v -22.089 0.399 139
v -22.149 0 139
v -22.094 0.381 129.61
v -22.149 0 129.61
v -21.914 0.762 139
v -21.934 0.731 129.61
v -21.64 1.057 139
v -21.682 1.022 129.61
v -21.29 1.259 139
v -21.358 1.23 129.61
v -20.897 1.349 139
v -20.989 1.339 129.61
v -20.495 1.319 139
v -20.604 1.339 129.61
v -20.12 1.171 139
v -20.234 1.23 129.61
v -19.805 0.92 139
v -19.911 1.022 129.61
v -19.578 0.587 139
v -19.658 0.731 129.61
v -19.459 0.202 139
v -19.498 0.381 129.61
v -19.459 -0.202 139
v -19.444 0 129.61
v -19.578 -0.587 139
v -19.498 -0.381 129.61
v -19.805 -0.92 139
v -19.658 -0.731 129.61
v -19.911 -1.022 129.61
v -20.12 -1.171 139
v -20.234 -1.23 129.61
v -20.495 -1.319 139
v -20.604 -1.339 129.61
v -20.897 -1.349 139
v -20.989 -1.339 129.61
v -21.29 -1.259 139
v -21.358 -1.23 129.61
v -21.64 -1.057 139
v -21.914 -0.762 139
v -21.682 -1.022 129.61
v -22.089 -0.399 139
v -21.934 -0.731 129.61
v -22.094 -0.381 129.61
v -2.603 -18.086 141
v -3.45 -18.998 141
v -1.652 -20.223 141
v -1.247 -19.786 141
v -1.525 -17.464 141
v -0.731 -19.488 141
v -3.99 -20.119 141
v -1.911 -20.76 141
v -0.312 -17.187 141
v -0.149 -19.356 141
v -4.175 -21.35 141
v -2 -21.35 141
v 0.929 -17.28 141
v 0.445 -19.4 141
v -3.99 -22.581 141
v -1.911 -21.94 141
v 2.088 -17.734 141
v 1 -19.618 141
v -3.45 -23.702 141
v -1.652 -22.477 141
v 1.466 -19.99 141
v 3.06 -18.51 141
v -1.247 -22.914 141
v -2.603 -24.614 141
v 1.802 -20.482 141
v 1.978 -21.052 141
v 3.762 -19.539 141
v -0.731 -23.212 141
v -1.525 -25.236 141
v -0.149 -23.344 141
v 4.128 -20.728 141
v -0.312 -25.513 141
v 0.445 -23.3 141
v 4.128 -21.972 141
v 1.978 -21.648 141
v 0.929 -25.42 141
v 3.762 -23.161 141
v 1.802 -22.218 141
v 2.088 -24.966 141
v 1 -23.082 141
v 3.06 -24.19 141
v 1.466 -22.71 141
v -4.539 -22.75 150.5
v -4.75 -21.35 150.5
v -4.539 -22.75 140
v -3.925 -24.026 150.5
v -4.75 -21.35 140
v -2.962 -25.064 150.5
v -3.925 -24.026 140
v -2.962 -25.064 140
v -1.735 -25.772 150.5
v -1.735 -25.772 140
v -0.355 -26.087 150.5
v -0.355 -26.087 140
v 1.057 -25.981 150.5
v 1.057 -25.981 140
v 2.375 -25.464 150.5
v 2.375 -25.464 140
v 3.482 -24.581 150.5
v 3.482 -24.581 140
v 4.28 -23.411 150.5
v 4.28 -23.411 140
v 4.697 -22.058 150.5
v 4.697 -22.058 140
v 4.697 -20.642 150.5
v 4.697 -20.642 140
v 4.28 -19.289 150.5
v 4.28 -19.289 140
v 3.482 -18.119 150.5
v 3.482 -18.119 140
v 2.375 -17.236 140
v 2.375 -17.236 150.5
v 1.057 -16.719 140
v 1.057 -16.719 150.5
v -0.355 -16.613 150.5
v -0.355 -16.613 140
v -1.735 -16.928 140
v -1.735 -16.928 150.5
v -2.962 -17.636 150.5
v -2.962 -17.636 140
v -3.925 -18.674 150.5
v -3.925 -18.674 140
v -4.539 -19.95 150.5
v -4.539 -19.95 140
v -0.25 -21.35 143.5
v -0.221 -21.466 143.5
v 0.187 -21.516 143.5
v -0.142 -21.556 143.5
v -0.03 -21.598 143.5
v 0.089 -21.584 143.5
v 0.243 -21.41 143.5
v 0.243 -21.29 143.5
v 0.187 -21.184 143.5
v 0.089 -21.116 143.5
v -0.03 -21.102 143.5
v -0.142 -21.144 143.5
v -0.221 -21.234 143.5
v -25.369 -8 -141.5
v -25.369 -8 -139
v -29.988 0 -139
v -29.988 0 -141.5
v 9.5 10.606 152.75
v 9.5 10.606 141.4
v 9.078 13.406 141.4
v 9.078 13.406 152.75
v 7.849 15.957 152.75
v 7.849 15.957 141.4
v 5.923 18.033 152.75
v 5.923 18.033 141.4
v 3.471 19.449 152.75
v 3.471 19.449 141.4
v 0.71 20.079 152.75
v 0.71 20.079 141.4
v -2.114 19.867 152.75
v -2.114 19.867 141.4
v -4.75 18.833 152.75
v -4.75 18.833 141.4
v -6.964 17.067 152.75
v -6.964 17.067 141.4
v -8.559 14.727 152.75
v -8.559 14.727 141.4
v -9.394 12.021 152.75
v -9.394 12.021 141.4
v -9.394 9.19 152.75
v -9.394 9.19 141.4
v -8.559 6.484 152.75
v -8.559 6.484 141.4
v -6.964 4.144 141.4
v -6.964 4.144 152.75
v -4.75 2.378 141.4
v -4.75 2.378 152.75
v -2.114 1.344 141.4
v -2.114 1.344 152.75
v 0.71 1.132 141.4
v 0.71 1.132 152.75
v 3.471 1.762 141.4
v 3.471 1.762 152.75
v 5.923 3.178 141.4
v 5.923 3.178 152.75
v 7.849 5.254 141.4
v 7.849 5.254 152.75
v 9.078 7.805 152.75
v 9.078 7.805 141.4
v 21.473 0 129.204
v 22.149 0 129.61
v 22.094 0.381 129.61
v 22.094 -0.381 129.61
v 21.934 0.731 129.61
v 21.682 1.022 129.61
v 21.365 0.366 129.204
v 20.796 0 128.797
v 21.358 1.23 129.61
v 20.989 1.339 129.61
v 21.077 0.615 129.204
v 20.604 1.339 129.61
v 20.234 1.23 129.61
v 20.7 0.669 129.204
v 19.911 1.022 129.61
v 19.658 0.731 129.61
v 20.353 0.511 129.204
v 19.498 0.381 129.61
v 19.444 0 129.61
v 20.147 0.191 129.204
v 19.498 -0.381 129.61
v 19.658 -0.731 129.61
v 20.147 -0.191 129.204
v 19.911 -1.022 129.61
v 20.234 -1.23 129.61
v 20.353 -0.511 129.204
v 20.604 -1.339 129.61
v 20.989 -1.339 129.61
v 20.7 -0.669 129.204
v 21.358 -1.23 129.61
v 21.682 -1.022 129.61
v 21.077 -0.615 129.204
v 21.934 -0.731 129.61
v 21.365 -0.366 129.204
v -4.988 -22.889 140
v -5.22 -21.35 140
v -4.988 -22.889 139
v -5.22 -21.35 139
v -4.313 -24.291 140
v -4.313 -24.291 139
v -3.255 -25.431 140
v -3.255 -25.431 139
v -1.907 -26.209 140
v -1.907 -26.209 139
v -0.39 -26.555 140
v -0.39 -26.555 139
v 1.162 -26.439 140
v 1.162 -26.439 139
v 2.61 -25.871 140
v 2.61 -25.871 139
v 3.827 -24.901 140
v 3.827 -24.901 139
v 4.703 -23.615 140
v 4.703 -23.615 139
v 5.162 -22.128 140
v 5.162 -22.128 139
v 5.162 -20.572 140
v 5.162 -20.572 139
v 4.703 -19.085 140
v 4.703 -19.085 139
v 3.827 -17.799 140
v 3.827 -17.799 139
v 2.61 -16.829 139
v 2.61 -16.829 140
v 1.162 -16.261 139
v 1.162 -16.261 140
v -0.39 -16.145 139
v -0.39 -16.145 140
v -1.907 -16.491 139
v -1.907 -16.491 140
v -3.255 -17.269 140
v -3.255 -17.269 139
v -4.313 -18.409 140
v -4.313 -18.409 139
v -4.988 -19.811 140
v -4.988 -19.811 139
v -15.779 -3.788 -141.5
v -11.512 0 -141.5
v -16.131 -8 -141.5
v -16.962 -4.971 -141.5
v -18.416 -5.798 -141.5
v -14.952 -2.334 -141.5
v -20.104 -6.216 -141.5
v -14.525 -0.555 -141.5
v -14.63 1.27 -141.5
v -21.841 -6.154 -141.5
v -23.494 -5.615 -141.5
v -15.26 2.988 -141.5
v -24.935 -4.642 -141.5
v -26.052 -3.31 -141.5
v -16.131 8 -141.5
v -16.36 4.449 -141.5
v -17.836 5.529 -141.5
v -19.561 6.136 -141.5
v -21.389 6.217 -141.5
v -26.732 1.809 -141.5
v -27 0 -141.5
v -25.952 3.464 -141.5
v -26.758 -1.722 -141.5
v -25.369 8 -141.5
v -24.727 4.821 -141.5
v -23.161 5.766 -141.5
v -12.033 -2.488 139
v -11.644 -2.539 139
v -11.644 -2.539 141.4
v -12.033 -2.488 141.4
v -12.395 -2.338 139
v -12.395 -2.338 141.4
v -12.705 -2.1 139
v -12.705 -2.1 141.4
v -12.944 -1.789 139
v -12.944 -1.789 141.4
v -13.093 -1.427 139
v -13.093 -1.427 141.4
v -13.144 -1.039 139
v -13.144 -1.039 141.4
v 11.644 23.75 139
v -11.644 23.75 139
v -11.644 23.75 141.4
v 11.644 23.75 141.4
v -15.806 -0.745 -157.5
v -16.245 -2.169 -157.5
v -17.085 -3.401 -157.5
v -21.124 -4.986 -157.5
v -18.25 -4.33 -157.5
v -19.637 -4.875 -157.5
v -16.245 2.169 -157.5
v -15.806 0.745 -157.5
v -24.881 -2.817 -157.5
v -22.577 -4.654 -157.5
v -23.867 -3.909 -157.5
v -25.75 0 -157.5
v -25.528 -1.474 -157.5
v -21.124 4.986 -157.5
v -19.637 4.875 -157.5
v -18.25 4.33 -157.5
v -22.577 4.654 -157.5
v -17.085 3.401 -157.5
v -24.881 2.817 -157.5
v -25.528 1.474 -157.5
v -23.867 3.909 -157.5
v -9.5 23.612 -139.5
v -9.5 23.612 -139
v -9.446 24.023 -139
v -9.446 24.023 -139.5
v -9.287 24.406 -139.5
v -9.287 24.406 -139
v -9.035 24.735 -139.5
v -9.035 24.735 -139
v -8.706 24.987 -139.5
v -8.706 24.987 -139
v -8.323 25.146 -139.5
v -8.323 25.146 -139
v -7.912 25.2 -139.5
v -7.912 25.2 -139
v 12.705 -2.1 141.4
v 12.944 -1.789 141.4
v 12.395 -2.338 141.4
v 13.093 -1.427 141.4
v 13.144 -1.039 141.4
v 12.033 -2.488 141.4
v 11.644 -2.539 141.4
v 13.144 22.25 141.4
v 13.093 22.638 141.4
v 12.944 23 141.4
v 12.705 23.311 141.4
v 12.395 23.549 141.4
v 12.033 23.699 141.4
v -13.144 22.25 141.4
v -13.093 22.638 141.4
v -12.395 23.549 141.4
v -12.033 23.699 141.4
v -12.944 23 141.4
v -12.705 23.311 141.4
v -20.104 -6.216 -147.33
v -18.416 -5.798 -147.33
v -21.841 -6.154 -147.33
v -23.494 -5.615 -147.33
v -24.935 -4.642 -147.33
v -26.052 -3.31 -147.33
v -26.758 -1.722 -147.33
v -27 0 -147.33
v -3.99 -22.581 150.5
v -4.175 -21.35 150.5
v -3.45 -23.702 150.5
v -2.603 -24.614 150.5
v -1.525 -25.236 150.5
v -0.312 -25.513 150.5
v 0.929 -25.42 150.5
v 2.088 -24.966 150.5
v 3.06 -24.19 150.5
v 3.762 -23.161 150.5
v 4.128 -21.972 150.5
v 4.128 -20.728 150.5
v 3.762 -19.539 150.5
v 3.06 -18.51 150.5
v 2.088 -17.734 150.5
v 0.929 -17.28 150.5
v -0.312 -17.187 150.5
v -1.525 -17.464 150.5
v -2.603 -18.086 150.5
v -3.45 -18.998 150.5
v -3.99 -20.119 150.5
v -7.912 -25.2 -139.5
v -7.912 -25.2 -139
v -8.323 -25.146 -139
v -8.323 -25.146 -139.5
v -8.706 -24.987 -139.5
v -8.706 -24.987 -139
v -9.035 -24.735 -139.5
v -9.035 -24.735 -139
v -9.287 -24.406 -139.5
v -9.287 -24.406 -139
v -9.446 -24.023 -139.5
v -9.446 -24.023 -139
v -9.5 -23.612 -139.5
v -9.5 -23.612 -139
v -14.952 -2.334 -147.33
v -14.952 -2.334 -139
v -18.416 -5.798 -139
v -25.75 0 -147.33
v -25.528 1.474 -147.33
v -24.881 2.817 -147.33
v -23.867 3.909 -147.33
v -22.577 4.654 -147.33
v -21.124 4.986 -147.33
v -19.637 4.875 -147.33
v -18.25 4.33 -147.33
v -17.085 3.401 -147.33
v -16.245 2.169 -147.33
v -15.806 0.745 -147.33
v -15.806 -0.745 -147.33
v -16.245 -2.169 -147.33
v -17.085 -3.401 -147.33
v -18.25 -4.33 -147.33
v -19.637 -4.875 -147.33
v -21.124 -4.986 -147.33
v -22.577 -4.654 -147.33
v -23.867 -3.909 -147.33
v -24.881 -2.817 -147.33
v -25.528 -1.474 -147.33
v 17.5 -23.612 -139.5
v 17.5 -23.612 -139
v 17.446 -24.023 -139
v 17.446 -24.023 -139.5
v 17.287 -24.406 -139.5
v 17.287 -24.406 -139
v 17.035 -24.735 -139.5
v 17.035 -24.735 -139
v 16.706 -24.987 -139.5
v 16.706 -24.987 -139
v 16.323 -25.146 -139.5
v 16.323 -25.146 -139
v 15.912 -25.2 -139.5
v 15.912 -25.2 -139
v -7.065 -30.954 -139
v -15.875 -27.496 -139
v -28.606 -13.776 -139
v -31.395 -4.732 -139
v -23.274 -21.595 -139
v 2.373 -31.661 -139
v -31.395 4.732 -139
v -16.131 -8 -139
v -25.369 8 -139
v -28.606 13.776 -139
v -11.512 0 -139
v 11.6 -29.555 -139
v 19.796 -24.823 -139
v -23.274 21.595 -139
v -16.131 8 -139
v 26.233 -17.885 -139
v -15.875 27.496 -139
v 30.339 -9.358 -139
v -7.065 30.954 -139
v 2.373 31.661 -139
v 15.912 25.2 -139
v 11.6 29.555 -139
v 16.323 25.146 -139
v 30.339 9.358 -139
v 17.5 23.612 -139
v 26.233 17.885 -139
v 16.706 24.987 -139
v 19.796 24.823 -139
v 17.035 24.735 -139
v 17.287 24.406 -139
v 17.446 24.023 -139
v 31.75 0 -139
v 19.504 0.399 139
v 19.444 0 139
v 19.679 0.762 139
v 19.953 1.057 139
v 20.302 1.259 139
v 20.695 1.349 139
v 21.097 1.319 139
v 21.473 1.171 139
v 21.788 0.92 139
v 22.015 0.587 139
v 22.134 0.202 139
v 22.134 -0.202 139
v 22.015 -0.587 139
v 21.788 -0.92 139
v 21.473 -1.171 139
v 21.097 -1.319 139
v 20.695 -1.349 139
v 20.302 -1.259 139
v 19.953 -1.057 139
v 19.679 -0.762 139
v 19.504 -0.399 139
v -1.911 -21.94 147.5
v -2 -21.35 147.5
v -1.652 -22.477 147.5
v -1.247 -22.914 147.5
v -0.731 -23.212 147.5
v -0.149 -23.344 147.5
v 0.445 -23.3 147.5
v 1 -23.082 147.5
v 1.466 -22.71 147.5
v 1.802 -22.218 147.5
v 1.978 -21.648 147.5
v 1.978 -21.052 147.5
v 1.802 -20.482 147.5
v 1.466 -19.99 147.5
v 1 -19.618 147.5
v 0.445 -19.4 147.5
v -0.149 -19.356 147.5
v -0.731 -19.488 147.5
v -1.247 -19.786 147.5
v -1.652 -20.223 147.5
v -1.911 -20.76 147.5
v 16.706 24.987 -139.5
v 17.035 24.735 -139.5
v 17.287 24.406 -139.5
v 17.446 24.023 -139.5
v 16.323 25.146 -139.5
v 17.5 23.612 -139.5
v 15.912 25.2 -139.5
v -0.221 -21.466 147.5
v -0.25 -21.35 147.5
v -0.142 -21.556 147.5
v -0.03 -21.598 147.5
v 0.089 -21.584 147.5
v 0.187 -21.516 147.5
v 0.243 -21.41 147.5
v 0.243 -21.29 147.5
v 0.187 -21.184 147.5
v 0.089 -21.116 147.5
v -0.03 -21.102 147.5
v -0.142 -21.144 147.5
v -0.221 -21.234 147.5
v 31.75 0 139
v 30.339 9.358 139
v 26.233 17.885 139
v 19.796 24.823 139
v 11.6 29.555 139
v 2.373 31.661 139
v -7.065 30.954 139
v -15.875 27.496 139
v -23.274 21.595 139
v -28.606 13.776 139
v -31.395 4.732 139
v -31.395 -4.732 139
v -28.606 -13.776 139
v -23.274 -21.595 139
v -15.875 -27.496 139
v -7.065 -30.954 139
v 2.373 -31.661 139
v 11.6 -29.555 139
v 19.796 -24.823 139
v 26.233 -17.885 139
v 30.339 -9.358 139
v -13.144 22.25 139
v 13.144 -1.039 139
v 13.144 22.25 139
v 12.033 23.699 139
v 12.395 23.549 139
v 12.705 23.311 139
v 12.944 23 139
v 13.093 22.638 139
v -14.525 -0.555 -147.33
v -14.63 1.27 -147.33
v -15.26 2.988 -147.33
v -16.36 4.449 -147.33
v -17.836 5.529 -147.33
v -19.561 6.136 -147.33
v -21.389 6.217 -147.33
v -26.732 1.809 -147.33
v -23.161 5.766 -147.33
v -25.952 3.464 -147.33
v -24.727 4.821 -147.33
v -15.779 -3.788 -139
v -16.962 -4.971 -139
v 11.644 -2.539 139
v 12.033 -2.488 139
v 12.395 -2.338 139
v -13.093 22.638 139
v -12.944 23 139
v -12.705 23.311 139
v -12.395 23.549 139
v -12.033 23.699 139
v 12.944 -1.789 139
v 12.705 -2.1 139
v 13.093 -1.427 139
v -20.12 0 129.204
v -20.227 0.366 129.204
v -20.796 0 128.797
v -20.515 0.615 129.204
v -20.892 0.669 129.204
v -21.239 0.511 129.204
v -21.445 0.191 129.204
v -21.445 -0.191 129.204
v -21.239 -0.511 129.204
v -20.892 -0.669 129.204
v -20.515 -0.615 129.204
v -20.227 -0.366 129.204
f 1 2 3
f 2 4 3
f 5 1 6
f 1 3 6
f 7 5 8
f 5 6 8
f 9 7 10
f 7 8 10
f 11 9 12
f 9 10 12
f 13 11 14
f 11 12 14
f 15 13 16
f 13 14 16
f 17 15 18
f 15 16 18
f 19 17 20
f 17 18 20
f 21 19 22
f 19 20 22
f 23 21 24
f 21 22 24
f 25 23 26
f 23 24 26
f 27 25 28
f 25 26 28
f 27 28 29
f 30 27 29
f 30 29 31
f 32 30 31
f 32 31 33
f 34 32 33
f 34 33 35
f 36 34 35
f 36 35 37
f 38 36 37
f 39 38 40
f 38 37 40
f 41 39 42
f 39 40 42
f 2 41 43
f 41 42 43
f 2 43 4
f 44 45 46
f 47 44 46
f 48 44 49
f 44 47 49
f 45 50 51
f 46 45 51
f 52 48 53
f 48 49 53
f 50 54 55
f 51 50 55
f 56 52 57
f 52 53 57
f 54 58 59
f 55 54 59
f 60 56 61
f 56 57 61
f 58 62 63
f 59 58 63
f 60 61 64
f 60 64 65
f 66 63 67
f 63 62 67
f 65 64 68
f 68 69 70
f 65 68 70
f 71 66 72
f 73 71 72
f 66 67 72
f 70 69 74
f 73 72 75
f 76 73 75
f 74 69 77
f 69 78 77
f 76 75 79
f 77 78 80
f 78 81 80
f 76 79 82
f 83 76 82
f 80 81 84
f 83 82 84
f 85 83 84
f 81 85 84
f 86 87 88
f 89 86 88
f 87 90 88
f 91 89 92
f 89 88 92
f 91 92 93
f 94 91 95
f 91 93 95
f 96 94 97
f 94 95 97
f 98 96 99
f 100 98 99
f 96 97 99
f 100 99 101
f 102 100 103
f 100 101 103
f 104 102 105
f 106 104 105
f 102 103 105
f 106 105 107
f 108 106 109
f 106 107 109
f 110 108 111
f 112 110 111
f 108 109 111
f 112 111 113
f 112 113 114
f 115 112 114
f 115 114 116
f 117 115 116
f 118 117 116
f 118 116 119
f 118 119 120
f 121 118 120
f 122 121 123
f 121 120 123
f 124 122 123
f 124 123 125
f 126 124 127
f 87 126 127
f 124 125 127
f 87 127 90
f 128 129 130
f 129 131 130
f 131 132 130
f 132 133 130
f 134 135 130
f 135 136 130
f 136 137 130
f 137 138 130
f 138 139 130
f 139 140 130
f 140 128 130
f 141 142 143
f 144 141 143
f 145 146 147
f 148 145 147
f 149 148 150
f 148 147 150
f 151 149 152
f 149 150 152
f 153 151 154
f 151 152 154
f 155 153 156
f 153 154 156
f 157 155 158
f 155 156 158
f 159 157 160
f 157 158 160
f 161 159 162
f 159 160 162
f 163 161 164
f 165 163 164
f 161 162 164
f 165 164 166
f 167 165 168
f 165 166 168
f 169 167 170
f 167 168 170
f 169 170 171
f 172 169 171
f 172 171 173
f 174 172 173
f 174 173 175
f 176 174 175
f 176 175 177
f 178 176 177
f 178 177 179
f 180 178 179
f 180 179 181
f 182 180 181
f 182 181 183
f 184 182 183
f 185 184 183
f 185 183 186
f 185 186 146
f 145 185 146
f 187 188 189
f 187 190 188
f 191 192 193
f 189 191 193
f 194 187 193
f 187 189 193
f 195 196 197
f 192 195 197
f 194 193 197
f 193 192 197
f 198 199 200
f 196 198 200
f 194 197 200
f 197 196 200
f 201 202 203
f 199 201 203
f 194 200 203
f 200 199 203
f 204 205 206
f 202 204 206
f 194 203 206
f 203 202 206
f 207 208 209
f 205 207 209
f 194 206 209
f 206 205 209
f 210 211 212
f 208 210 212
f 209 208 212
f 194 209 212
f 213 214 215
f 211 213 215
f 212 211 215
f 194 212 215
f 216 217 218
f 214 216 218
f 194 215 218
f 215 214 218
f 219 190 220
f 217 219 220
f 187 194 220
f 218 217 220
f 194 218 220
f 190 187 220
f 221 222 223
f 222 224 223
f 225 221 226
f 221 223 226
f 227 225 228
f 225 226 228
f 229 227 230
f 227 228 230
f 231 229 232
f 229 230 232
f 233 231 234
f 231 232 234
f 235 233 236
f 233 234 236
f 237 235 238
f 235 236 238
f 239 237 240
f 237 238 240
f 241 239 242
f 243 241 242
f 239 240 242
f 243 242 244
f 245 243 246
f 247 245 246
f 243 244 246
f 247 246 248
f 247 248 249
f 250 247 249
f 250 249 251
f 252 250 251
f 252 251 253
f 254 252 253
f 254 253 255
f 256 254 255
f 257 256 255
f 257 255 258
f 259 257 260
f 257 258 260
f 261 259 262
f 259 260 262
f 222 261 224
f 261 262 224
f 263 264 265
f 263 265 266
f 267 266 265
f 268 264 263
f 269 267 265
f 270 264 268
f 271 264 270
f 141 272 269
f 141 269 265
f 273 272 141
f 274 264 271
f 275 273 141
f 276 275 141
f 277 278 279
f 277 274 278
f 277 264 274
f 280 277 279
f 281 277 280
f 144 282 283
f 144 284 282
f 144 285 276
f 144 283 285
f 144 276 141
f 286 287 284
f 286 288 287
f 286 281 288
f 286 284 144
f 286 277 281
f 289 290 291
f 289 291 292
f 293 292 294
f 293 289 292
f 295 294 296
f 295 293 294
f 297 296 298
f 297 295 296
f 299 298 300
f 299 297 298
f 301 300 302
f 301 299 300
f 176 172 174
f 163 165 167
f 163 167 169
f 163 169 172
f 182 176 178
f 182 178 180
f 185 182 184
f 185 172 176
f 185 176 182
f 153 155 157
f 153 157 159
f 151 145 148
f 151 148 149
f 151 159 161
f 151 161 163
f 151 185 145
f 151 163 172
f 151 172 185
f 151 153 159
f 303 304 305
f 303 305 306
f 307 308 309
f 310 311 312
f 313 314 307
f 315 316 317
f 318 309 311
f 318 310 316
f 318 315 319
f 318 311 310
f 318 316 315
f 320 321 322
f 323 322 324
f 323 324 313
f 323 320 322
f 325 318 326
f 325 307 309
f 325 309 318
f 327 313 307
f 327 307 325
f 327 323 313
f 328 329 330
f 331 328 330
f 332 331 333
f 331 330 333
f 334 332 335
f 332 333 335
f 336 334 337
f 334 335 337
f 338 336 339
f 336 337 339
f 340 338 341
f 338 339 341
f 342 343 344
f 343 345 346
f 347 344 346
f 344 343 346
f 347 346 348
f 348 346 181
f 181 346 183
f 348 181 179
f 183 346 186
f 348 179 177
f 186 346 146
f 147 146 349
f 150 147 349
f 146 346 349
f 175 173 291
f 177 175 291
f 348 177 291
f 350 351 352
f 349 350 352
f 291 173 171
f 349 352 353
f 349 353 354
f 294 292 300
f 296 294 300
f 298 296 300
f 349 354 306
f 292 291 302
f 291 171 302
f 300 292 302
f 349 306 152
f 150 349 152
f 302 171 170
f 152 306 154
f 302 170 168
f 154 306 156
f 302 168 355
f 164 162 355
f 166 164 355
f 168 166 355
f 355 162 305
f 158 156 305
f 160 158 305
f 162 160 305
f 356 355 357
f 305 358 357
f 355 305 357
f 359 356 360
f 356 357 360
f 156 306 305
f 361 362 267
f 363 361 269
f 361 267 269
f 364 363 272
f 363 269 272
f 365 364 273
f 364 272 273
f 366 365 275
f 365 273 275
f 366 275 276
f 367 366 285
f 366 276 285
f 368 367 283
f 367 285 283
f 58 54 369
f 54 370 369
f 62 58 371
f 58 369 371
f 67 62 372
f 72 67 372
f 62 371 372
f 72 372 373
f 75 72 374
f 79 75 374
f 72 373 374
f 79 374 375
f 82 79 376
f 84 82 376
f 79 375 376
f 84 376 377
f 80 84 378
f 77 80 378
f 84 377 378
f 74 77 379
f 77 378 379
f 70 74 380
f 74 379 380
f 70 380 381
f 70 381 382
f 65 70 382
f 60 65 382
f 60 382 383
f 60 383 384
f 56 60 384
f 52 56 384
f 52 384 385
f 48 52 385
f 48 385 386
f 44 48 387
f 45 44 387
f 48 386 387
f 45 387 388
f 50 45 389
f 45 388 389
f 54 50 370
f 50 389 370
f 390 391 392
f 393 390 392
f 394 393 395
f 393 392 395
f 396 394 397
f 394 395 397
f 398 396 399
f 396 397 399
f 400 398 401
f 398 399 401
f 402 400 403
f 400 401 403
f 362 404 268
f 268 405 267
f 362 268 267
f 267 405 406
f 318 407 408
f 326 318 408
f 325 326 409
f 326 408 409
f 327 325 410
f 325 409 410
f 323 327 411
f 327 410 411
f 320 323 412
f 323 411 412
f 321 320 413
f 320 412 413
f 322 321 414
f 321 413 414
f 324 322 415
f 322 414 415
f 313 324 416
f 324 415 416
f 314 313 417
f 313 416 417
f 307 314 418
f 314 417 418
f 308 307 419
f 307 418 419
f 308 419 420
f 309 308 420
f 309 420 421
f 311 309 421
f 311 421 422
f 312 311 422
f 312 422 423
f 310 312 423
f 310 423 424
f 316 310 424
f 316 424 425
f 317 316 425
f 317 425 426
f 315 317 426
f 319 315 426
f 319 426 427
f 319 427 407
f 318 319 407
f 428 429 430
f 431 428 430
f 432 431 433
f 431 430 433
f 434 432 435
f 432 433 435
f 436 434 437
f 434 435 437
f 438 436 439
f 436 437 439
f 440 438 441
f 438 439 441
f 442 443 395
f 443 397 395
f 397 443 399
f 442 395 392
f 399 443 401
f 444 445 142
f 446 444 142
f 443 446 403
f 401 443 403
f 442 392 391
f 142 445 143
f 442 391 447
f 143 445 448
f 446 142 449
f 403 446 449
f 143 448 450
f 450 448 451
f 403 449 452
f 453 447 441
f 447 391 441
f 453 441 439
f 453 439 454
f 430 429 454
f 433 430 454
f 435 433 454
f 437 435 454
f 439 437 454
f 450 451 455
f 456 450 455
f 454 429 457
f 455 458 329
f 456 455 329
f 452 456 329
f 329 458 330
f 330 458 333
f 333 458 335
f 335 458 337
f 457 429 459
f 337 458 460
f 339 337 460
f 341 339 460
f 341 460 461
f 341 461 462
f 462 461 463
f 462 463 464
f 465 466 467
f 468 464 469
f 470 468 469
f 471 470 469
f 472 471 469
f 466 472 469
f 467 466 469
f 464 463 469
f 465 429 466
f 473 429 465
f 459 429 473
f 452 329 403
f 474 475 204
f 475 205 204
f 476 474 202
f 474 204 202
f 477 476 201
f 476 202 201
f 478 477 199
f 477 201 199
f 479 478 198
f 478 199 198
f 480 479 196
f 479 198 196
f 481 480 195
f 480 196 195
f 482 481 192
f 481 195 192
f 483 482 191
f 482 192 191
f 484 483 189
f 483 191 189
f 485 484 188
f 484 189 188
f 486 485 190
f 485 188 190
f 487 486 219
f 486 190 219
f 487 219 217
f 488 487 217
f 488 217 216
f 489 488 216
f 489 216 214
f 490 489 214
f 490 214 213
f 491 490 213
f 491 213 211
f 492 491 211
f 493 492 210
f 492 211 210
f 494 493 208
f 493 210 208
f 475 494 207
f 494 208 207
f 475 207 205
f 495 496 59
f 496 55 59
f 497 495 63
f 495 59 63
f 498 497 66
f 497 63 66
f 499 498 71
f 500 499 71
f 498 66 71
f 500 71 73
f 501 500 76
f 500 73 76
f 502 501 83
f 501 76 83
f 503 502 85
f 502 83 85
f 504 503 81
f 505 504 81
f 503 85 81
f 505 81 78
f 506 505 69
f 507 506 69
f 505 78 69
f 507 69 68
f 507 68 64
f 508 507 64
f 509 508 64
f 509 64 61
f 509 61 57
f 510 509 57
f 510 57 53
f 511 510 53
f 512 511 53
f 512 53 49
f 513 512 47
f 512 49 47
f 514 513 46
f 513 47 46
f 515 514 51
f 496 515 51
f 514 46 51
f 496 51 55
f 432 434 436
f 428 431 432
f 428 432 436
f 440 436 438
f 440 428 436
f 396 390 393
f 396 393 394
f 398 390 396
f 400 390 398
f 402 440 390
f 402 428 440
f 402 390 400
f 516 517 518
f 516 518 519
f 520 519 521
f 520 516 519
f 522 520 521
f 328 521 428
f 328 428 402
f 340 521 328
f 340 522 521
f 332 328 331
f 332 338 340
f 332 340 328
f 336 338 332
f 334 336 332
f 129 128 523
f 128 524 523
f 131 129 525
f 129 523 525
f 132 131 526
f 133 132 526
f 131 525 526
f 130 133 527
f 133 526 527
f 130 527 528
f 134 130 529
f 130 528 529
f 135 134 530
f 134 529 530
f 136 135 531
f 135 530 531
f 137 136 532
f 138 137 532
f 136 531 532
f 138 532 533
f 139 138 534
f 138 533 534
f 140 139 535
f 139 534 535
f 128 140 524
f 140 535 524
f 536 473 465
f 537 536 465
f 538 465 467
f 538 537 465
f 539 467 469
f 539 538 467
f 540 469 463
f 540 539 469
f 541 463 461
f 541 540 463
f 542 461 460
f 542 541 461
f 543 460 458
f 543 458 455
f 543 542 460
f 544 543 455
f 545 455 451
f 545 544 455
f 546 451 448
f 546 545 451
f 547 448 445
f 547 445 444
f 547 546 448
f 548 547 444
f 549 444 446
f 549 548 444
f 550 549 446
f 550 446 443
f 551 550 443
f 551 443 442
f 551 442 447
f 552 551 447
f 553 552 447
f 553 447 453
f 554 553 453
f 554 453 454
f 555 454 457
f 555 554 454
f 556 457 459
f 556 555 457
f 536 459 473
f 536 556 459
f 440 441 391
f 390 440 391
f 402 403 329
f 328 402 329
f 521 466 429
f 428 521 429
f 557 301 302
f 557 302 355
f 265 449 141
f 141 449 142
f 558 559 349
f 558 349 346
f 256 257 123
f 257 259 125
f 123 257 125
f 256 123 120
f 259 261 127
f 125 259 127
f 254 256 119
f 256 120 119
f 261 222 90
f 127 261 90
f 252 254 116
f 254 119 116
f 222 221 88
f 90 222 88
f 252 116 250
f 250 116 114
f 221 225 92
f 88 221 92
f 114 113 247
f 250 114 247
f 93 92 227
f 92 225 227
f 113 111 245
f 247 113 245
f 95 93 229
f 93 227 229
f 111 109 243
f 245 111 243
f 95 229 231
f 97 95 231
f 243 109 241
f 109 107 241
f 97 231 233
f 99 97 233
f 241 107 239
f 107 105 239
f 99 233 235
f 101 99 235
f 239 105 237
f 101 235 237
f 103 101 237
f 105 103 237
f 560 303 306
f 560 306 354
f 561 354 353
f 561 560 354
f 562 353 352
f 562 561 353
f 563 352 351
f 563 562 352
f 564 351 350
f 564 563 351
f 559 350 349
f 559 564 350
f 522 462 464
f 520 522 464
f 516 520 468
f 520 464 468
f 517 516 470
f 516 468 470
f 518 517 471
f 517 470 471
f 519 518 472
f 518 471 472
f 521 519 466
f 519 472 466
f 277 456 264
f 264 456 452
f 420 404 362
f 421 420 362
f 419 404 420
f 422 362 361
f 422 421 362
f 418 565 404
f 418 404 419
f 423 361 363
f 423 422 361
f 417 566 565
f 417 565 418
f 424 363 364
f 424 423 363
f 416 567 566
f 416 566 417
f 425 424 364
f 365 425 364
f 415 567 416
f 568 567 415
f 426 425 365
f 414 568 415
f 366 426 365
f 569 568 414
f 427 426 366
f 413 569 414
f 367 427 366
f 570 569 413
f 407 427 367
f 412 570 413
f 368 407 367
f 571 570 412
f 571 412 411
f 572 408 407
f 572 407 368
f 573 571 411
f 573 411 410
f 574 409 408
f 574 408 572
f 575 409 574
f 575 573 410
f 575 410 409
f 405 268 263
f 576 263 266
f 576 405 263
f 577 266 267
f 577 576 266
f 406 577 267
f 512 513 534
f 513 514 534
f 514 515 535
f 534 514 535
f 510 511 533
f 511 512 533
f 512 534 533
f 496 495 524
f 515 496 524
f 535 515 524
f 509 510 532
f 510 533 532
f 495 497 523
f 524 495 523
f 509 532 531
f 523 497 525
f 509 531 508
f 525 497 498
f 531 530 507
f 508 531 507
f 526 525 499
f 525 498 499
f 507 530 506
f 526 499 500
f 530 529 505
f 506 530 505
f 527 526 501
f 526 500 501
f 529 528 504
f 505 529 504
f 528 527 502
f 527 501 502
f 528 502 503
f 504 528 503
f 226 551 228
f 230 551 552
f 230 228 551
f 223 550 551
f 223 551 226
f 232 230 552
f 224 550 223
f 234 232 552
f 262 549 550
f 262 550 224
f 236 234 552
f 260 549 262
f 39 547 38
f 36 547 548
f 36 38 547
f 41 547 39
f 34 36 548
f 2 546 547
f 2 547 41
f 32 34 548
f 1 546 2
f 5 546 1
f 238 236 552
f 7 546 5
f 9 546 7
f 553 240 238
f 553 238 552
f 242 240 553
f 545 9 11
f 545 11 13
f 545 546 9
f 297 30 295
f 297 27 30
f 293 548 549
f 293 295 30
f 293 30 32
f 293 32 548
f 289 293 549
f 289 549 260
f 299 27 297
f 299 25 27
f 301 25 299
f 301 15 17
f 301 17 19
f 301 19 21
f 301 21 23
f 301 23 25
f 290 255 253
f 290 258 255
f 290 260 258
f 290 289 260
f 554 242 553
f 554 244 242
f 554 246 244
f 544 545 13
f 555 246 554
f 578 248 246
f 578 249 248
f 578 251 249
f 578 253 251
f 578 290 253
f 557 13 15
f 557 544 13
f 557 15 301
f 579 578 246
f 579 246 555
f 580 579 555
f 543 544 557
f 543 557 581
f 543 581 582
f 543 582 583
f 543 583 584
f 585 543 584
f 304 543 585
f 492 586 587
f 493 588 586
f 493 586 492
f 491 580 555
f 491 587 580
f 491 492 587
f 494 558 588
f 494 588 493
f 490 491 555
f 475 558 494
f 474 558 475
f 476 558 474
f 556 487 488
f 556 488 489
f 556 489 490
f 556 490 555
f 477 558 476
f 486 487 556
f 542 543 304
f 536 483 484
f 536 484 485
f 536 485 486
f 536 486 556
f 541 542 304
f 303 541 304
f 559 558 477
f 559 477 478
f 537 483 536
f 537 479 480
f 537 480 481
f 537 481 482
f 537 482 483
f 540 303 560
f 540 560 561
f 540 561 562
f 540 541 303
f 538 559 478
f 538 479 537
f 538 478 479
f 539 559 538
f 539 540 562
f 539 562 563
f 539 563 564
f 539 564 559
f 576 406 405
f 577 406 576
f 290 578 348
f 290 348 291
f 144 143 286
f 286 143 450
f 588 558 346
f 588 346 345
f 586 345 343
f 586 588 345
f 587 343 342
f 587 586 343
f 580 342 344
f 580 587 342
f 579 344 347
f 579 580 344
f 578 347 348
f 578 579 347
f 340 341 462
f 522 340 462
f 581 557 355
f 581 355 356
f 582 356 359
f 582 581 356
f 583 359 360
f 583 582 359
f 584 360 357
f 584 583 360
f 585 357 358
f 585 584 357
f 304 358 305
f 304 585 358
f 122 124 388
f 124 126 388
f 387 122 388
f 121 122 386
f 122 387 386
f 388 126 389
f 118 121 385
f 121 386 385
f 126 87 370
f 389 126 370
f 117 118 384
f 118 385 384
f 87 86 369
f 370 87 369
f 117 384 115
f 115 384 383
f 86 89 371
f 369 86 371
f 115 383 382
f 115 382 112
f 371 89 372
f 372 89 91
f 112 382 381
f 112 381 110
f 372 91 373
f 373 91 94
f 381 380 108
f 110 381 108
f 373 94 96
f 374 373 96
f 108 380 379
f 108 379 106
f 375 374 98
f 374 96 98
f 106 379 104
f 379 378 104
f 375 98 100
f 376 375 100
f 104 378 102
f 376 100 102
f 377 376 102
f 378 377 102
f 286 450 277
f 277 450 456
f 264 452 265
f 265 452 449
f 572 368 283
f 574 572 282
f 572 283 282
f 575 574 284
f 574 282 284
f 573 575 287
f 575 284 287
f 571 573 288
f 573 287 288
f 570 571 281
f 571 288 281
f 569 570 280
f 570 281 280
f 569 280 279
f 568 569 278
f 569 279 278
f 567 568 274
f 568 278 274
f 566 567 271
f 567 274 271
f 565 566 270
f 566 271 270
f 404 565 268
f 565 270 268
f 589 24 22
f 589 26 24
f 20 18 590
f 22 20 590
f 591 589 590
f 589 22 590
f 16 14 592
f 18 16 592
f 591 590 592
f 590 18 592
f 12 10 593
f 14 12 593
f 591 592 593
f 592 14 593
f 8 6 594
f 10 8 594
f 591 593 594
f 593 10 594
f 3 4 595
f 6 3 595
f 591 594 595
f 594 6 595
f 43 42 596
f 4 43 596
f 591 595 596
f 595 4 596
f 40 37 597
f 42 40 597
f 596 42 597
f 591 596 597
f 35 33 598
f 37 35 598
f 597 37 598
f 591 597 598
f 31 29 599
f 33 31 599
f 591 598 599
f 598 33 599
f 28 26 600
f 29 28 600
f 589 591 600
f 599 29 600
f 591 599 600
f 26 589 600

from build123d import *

# Parameters (mm, degrees)
SKETCH1_R                 = 31.75
BOSS_EXTRUDE1_DEPTH       = 139
SKETCH3_R                 = 9.5
BOSS_EXTRUDE2_DEPTH       = 2.4
SKETCH3_2_R               = 9.5
BOSS_EXTRUDE3_DEPTH       = 13.75
F_6_32_TAPPED_HOLE1_D     = 2.7051
F_6_32_TAPPED_HOLE1_DEPTH = 9.39
F_6_32_TAPPED_HOLE1_TIP   = 0.81269403
BOSS_EXTRUDE4_DEPTH       = 2.5
SKETCH7_3_R               = 5
BOSS_EXTRUDE5_DEPTH       = 8.33
SKETCH7_4_R               = 5
BOSS_EXTRUDE6_DEPTH       = 18.5
BOSS_EXTRUDE7_DEPTH       = 0.5


with BuildPart() as part:
    # Sketch1 → Boss-Extrude1 (new, symmetric)
    with BuildSketch(Plane.XY):
        Circle(SKETCH1_R)
    extrude(amount=BOSS_EXTRUDE1_DEPTH, both=True)

    # Sketch3 → Boss-Extrude2 (add)
    with BuildSketch(Plane.XY.offset(139)):
        with BuildLine():
            Line((11.6445, -2.539), (-11.6445, -2.539))
            ThreePointArc((-11.6445, -2.539), (-12.705160172, -2.099660172), (-13.1445, -1.039))
            Line((-13.1445, -1.039), (-13.1445, 22.25))
            ThreePointArc((-13.1445, 22.25), (-12.705160172, 23.310660172), (-11.6445, 23.75))
            Line((-11.6445, 23.75), (11.6445, 23.75))
            ThreePointArc((11.6445, 23.75), (12.705160172, 23.310660172), (13.1445, 22.25))
            Line((13.1445, 22.25), (13.1445, -1.039))
            ThreePointArc((13.1445, -1.039), (12.705160172, -2.099660172), (11.6445, -2.539))
        make_face()
        with Locations((0, 10.6055)):
            Circle(SKETCH3_R, mode=Mode.SUBTRACT)
    extrude(amount=BOSS_EXTRUDE2_DEPTH)

    # Sketch3<2> → Boss-Extrude3 (add)
    with BuildSketch(Plane.XY.offset(139)):
        with Locations((0, 10.6055)):
            Circle(SKETCH3_2_R)
    extrude(amount=BOSS_EXTRUDE3_DEPTH)

    # Sketch4 → Revolve1 (revolve)
    with BuildSketch(Plane(origin=(0, -21.35, 0), x_dir=(1, 0, 0), z_dir=(0, 1, 0))):
        Polygon((0, -139), (0, -143.5), (-0.25, -143.5), (-0.25, -147.5), (-2, -147.5), (-2, -141), (-4.175, -141), (-4.175, -150.5), (-4.75, -150.5), (-4.75, -140), (-5.22, -140), (-5.22, -139), align=None)
    revolve(axis=Axis((0, -21.35, 143.5), (0, 0, 1)))

    # #6-32 Tapped Hole1
    with Locations(Plane.XY.offset(139)):
        with Locations((-20.79625, 0), (20.79625, 0)):
            Hole(F_6_32_TAPPED_HOLE1_D / 2, depth=F_6_32_TAPPED_HOLE1_DEPTH)
            with Locations((0, 0, -(F_6_32_TAPPED_HOLE1_DEPTH + F_6_32_TAPPED_HOLE1_TIP / 2))):  # 118° drill point
                Cone(0, F_6_32_TAPPED_HOLE1_D / 2, F_6_32_TAPPED_HOLE1_TIP, mode=Mode.SUBTRACT)

    # Sketch7 → Boss-Extrude4 (add)
    with BuildSketch(Plane(origin=(0, 0, -139), x_dir=(-1, 0, 0), z_dir=(0, 0, -1))):
        Polygon((25.368802154, 8), (16.131197846, 8), (11.512395693, 0), (16.131197846, -8), (25.368802154, -8), (29.987604307, 0), align=None)
        with BuildLine():
            ThreePointArc((18.416186816, -5.797914799), (16.330582618, -4.419417382), (14.952085201, -2.333813184))
            ThreePointArc((14.952085201, -2.333813184), (19.56140156, 6.135937887), (27, 0))
            ThreePointArc((27, 0), (24.248297271, -5.179229306), (18.416186816, -5.797914799))
        make_face(mode=Mode.SUBTRACT)
    extrude(amount=BOSS_EXTRUDE4_DEPTH)

    # Sketch7<3> → Boss-Extrude5 (add)
    with BuildSketch(Plane(origin=(0, 0, -139), x_dir=(-1, 0, 0), z_dir=(0, 0, -1))):
        with BuildLine():
            ThreePointArc((27, 0), (19.56140156, 6.135937887), (14.952085201, -2.333813184))
            Line((14.952085201, -2.333813184), (18.416186816, -5.797914799))
            ThreePointArc((18.416186816, -5.797914799), (24.248297271, -5.179229306), (27, 0))
        make_face()
        with Locations((20.75, 0)):
            Circle(SKETCH7_3_R, mode=Mode.SUBTRACT)
    extrude(amount=BOSS_EXTRUDE5_DEPTH)

    # Sketch7<4> → Boss-Extrude6 (add)
    with BuildSketch(Plane(origin=(0, 0, -139), x_dir=(-1, 0, 0), z_dir=(0, 0, -1))):
        with Locations((20.75, 0)):
            Circle(SKETCH7_4_R)
    extrude(amount=BOSS_EXTRUDE6_DEPTH)

    # Sketch8 → Boss-Extrude7 (add)
    with BuildSketch(Plane(origin=(0, 0, -139), x_dir=(-1, 0, 0), z_dir=(0, 0, -1))):
        with BuildLine():
            Line((7.9125, 25.2), (-15.9125, 25.2))
            ThreePointArc((-15.9125, 25.2), (-17.035032015, 24.735032015), (-17.5, 23.6125))
            Line((-17.5, 23.6125), (-17.5, -23.6125))
            ThreePointArc((-17.5, -23.6125), (-17.035032015, -24.735032015), (-15.9125, -25.2))
            Line((-15.9125, -25.2), (7.9125, -25.2))
            ThreePointArc((7.9125, -25.2), (9.035032015, -24.735032015), (9.5, -23.6125))
            Line((9.5, -23.6125), (9.5, 23.6125))
            ThreePointArc((9.5, 23.6125), (9.035032015, 24.735032015), (7.9125, 25.2))
        make_face()
    extrude(amount=BOSS_EXTRUDE7_DEPTH)


solid = part.part
